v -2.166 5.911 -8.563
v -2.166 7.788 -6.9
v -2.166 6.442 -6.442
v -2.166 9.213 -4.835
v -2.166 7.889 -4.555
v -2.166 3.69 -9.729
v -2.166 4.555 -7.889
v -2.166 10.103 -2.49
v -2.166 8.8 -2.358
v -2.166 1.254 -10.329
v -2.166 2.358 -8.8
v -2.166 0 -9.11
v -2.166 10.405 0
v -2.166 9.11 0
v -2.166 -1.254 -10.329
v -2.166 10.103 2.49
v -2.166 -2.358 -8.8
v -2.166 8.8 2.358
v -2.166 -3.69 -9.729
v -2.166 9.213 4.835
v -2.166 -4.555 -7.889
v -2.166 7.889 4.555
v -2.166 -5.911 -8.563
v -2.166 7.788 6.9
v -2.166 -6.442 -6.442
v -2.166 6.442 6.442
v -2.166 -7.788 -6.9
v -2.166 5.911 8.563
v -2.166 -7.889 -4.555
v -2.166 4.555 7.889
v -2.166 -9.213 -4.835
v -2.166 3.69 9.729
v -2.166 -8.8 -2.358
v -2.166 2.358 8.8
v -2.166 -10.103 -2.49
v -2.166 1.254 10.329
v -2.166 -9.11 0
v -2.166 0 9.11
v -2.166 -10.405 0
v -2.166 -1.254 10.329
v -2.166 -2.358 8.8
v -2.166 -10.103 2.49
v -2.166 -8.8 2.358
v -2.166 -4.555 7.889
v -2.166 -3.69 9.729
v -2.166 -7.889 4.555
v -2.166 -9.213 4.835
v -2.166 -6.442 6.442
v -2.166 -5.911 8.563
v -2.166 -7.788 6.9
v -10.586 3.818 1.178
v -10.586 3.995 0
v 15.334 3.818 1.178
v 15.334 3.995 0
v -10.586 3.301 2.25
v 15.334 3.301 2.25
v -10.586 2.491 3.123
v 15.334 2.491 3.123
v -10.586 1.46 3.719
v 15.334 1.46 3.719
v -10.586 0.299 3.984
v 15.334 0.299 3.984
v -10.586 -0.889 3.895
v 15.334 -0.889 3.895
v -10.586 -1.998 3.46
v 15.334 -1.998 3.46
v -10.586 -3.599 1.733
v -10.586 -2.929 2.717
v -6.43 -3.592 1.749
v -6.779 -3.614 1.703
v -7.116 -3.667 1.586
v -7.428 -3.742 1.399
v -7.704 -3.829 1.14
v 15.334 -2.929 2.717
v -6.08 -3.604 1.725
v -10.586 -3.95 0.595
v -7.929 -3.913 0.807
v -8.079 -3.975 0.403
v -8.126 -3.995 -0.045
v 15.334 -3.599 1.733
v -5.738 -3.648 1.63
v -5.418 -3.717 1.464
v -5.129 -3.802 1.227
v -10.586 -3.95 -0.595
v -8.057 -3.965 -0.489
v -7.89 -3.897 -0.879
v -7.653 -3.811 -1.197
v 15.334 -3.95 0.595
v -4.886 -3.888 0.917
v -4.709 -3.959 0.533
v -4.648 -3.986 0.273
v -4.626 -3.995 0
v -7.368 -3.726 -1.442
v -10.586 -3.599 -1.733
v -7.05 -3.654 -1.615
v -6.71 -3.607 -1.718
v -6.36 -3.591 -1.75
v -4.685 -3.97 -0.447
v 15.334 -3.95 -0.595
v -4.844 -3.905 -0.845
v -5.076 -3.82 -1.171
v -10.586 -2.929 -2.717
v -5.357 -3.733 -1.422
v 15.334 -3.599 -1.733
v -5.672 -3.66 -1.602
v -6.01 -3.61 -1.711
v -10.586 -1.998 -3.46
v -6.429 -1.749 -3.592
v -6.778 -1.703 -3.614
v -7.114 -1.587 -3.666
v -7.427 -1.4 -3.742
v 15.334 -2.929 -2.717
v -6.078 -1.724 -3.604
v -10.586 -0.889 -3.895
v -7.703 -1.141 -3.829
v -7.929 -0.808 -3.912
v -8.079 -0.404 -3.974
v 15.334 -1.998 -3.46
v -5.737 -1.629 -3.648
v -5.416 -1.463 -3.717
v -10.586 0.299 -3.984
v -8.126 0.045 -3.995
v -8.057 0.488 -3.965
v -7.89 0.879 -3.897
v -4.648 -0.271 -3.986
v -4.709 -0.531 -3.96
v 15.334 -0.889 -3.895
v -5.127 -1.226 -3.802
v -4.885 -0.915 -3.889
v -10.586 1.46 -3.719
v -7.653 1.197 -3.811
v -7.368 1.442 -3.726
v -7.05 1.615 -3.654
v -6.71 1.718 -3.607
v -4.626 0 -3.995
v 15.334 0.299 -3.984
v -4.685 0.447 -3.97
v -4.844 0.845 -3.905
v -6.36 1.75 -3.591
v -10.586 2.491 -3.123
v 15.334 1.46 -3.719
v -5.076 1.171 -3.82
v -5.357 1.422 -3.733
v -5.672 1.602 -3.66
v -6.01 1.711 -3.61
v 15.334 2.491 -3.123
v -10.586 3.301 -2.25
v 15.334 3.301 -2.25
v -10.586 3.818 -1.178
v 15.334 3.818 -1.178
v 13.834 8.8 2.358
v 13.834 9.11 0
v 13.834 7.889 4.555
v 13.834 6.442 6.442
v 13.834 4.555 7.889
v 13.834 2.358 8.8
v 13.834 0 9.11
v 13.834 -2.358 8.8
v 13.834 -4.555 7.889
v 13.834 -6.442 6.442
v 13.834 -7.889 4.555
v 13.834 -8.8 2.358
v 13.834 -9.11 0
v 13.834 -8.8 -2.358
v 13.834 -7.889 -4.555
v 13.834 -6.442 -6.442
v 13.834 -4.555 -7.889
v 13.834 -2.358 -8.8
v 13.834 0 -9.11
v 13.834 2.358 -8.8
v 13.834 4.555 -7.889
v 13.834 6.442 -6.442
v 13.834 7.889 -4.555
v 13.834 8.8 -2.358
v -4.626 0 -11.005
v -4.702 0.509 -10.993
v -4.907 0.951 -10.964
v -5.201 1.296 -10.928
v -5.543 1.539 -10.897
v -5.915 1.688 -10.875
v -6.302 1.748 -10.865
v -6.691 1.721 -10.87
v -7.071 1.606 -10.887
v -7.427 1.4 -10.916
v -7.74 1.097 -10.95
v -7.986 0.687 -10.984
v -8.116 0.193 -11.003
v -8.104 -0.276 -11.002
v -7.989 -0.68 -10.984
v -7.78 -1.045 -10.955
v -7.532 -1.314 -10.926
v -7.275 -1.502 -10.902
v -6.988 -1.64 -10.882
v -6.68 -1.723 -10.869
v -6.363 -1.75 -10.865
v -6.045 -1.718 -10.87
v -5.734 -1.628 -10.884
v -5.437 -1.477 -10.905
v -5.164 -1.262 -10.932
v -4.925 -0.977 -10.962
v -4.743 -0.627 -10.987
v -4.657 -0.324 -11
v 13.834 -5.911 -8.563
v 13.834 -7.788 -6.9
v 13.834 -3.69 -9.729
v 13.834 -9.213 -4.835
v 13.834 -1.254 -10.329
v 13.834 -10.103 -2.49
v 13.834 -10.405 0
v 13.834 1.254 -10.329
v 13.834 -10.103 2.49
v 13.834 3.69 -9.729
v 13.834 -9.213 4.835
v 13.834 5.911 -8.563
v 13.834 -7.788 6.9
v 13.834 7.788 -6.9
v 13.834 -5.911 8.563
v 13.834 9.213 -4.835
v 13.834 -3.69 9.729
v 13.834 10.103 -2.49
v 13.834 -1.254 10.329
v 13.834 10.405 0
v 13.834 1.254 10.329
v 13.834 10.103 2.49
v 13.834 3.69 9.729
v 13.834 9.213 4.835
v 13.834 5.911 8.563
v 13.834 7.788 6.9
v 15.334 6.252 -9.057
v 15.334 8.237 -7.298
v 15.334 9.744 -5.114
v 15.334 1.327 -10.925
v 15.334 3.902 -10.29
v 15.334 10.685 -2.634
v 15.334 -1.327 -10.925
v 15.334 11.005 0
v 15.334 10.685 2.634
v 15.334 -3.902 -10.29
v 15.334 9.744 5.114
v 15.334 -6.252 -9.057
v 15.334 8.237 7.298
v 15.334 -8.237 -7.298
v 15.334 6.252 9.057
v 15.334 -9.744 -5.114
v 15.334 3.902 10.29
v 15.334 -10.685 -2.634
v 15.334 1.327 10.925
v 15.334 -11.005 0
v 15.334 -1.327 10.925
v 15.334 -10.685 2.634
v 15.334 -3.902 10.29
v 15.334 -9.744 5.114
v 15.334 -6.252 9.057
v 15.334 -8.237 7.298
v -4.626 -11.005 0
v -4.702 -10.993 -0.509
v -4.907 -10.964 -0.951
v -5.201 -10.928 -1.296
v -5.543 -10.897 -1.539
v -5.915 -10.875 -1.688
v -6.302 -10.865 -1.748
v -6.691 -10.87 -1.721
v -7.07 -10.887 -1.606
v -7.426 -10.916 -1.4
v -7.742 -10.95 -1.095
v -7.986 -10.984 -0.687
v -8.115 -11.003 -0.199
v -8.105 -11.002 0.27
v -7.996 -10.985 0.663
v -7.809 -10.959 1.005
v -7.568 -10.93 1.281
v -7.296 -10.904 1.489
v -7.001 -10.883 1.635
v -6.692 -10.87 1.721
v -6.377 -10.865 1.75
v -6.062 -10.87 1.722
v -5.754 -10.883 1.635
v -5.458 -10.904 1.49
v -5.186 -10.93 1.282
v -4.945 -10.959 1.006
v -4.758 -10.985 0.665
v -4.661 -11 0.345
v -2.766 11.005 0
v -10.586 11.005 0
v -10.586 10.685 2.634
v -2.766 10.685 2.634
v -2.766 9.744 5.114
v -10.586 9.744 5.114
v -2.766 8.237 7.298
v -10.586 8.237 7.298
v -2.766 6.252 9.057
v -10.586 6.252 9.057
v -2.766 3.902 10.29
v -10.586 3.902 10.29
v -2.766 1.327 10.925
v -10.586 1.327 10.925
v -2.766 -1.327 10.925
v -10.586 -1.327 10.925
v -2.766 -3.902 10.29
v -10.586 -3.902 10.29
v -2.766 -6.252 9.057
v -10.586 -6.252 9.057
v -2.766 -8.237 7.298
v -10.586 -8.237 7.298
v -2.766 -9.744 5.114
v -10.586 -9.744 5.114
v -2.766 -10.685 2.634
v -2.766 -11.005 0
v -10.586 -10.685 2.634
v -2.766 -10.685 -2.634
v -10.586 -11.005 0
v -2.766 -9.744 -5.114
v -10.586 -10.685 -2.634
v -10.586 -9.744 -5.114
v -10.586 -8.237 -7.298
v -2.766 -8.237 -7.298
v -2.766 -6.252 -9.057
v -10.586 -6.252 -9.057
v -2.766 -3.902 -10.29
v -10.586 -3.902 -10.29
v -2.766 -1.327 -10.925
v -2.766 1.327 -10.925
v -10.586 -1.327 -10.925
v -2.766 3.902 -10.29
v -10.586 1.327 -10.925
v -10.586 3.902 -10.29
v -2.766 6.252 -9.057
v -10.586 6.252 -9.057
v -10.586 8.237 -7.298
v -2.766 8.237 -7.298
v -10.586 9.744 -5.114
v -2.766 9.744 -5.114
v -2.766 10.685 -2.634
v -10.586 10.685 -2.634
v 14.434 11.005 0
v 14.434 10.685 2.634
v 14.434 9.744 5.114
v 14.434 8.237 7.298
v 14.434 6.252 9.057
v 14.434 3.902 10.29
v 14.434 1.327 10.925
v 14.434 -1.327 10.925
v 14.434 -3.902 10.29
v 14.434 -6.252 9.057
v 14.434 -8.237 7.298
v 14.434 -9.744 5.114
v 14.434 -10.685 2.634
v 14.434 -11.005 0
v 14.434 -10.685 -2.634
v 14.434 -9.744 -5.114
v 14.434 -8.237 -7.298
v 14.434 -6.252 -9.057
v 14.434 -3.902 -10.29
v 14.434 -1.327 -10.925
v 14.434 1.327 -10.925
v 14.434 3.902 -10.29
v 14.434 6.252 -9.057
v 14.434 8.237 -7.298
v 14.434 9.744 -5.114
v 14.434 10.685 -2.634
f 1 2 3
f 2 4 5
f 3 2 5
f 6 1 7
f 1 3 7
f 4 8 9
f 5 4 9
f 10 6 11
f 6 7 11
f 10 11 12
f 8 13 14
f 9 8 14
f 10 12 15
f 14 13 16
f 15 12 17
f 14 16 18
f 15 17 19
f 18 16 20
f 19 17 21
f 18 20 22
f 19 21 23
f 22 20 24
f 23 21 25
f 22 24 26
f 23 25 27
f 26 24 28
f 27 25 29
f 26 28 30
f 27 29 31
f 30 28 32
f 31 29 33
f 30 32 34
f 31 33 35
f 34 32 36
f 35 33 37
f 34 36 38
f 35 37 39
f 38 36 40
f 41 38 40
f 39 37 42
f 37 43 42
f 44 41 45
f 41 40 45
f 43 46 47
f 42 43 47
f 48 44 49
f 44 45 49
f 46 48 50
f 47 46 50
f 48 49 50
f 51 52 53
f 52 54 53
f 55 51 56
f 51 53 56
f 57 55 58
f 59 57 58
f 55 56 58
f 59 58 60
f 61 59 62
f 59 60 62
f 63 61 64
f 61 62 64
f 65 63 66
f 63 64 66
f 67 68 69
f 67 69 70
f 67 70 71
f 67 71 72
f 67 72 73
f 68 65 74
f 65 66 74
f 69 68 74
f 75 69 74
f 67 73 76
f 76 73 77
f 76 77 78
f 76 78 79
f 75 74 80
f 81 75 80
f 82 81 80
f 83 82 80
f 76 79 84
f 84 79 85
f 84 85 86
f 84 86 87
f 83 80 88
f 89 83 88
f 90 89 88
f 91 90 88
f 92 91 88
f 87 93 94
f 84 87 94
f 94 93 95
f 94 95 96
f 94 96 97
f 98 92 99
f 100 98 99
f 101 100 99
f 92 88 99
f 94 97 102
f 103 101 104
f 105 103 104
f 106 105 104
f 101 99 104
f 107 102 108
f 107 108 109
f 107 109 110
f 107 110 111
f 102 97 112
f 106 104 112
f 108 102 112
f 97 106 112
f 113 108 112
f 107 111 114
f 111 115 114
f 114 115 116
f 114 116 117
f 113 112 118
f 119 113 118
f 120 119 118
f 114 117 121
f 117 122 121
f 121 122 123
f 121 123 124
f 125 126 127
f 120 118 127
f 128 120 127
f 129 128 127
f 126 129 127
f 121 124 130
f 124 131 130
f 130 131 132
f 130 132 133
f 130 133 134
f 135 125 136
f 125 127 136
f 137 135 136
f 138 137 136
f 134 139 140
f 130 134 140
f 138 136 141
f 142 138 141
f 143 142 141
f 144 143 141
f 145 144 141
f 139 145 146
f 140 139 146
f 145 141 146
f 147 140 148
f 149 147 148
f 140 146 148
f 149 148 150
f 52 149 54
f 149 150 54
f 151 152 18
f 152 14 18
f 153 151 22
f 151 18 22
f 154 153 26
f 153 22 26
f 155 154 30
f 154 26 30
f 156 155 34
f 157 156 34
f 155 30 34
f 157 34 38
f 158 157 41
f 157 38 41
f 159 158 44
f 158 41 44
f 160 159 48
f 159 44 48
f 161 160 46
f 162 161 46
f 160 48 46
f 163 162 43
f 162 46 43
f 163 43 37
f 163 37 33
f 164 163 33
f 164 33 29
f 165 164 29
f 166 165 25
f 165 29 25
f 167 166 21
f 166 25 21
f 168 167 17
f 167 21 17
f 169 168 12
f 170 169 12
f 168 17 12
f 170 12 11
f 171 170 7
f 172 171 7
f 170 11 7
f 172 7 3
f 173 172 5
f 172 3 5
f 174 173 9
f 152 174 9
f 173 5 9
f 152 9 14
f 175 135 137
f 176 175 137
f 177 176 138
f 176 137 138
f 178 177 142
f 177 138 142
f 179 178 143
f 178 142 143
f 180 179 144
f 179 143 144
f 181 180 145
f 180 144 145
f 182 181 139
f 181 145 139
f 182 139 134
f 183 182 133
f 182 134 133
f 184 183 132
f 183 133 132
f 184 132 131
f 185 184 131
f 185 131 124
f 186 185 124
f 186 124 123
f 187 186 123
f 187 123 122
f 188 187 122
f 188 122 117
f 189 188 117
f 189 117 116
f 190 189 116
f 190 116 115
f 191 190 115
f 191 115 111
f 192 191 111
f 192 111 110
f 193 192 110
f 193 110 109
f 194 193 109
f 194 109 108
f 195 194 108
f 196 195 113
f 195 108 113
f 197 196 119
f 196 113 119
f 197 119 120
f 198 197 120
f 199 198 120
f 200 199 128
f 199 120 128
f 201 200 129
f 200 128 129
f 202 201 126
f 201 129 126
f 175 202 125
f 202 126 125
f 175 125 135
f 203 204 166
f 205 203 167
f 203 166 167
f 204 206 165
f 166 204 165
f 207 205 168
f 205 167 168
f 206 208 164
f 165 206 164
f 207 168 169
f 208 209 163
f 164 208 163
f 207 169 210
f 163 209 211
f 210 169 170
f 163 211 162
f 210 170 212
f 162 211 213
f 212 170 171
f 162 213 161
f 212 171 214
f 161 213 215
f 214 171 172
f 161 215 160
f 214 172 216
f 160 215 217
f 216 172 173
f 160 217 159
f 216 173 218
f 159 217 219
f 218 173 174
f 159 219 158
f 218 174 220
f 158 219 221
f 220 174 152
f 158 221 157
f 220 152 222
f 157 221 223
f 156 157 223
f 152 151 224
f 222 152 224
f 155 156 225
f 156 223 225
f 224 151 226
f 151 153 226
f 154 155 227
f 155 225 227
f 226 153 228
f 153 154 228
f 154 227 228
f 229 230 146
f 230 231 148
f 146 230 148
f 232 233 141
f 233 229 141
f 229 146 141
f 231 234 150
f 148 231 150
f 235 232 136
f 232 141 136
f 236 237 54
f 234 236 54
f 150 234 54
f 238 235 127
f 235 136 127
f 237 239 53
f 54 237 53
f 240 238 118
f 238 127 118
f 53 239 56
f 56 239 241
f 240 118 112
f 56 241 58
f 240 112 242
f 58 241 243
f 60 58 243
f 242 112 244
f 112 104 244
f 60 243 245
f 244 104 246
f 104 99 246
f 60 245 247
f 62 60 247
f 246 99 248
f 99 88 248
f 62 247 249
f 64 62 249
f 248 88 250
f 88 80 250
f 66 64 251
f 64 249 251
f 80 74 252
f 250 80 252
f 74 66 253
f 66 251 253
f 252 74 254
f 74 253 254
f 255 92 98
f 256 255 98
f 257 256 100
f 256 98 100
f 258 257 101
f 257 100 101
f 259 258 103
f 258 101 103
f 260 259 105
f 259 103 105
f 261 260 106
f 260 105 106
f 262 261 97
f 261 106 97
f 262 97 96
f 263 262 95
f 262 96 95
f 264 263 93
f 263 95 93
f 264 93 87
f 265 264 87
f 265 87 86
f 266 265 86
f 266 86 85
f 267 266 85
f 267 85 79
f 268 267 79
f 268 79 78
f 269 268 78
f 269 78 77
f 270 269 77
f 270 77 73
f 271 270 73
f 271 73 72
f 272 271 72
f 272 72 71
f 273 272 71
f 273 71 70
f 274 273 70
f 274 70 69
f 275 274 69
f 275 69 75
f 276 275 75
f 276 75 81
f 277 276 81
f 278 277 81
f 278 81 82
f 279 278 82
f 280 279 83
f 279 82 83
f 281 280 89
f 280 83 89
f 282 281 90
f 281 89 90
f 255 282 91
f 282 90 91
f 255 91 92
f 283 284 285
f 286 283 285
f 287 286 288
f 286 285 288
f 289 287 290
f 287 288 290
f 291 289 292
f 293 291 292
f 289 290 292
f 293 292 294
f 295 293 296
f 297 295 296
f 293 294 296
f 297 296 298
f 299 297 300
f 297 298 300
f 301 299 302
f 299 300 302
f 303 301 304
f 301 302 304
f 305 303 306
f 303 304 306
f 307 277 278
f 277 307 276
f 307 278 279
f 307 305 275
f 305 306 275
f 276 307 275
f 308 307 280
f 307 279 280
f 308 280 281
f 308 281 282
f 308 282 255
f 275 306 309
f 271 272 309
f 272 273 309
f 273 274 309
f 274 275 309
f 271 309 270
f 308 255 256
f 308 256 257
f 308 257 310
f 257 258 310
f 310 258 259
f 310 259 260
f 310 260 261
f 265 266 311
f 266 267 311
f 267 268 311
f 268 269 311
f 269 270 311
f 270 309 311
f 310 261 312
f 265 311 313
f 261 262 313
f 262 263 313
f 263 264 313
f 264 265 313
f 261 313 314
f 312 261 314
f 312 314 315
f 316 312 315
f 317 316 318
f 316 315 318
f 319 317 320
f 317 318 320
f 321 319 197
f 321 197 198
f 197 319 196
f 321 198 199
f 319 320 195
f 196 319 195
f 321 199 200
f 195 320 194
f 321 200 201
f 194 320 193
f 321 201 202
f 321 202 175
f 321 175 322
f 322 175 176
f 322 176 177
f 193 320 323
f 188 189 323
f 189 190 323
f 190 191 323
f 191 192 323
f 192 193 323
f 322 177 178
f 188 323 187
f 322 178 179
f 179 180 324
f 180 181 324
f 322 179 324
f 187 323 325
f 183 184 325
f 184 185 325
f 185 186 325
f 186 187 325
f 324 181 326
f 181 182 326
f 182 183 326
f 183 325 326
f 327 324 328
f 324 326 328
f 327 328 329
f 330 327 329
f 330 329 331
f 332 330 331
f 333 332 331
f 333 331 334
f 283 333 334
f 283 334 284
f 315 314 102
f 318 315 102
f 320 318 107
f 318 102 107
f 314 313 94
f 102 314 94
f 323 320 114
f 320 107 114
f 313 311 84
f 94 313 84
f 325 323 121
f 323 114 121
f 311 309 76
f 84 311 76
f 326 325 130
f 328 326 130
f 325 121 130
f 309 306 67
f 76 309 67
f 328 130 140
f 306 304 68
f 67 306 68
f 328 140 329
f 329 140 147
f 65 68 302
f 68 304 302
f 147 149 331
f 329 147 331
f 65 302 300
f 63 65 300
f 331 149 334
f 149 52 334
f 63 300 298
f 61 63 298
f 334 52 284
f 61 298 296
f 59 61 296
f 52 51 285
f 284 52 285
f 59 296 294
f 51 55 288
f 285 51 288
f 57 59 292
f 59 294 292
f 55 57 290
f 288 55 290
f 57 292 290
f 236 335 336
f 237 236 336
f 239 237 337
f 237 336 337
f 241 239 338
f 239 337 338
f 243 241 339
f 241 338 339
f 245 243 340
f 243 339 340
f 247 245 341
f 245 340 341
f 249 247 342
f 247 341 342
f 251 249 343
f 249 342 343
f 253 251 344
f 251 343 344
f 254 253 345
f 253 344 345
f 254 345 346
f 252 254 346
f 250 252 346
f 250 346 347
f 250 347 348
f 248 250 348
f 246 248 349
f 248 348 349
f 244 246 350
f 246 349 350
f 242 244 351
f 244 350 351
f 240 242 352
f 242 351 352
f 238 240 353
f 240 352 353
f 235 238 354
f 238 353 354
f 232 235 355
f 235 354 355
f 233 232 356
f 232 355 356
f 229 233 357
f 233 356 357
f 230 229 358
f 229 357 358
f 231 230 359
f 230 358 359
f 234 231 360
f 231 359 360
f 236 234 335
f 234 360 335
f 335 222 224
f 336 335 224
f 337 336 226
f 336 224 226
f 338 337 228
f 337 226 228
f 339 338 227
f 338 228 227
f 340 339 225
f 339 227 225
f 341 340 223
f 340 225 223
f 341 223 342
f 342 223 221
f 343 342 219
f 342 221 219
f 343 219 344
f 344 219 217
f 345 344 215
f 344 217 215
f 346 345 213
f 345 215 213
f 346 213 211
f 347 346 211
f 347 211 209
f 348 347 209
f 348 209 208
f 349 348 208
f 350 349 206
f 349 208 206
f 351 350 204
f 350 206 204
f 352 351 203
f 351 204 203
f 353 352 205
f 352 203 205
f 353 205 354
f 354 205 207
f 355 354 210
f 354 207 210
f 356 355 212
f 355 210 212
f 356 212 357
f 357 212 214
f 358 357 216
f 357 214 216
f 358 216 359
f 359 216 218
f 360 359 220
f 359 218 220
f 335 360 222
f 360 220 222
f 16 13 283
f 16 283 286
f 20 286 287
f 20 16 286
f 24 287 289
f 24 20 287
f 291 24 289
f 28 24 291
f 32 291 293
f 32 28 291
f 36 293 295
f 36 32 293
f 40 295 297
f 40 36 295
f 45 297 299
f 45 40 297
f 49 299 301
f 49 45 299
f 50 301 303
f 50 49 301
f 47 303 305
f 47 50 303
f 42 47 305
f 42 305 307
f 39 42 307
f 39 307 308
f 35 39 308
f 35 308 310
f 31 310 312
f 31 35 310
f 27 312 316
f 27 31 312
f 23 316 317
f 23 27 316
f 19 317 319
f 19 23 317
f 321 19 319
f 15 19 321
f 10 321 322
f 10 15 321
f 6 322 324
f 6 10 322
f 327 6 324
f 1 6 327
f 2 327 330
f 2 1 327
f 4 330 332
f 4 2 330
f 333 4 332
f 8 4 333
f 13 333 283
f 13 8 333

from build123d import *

# Parameters (mm, degrees)
SKETCH2_R          = 1.75
CUT_EXTRUDE1_DEPTH = 17
CIRPATTERN1_COUNT  = 2
CIRPATTERN1_ANGLE  = 90
CHAMFER1_SIZE      = 0.6


with BuildPart() as part:
    # Sketch1 → Revolve1 (revolve)
    with BuildSketch(Plane.XY):
        Polygon((-10.58638484, 3.995), (-7.464927114, 3.995), (-1.431661808, 3.995), (15.33361516, 3.995), (15.33361516, 11.005), (13.83361516, 11.005), (13.83361516, 9.11), (-2.16638484, 9.11), (-2.16638484, 11.005), (-10.58638484, 11.005), align=None)
    revolve(axis=Axis((0, 0, 0), (1, 0, 0)))

    # Sketch2 → Cut-Extrude1 (cut)
    with BuildSketch(Plane.XY):
        with Locations((-6.37638484, 0)):
            Circle(SKETCH2_R)
    cut_extrude1 = extrude(amount=-CUT_EXTRUDE1_DEPTH, mode=Mode.SUBTRACT)

    # CirPattern1: Cut-Extrude1 ×2 about axis
    cirpattern1_axis = Axis((-10.58638484, 0, 0), (-1, 0, 0))
    for i in range(1, CIRPATTERN1_COUNT):
        add(cut_extrude1.rotate(cirpattern1_axis, i * CIRPATTERN1_ANGLE / (CIRPATTERN1_COUNT - 1)), mode=Mode.SUBTRACT)

    # Chamfer1
    chamfer1_edges = [part.edges().sort_by_distance(p)[0] for p in [
        (-2.16638484, -11.005, 0),
        (13.83361516, -11.005, 0),
    ]]
    chamfer(chamfer1_edges, length=CHAMFER1_SIZE)


solid = part.part
